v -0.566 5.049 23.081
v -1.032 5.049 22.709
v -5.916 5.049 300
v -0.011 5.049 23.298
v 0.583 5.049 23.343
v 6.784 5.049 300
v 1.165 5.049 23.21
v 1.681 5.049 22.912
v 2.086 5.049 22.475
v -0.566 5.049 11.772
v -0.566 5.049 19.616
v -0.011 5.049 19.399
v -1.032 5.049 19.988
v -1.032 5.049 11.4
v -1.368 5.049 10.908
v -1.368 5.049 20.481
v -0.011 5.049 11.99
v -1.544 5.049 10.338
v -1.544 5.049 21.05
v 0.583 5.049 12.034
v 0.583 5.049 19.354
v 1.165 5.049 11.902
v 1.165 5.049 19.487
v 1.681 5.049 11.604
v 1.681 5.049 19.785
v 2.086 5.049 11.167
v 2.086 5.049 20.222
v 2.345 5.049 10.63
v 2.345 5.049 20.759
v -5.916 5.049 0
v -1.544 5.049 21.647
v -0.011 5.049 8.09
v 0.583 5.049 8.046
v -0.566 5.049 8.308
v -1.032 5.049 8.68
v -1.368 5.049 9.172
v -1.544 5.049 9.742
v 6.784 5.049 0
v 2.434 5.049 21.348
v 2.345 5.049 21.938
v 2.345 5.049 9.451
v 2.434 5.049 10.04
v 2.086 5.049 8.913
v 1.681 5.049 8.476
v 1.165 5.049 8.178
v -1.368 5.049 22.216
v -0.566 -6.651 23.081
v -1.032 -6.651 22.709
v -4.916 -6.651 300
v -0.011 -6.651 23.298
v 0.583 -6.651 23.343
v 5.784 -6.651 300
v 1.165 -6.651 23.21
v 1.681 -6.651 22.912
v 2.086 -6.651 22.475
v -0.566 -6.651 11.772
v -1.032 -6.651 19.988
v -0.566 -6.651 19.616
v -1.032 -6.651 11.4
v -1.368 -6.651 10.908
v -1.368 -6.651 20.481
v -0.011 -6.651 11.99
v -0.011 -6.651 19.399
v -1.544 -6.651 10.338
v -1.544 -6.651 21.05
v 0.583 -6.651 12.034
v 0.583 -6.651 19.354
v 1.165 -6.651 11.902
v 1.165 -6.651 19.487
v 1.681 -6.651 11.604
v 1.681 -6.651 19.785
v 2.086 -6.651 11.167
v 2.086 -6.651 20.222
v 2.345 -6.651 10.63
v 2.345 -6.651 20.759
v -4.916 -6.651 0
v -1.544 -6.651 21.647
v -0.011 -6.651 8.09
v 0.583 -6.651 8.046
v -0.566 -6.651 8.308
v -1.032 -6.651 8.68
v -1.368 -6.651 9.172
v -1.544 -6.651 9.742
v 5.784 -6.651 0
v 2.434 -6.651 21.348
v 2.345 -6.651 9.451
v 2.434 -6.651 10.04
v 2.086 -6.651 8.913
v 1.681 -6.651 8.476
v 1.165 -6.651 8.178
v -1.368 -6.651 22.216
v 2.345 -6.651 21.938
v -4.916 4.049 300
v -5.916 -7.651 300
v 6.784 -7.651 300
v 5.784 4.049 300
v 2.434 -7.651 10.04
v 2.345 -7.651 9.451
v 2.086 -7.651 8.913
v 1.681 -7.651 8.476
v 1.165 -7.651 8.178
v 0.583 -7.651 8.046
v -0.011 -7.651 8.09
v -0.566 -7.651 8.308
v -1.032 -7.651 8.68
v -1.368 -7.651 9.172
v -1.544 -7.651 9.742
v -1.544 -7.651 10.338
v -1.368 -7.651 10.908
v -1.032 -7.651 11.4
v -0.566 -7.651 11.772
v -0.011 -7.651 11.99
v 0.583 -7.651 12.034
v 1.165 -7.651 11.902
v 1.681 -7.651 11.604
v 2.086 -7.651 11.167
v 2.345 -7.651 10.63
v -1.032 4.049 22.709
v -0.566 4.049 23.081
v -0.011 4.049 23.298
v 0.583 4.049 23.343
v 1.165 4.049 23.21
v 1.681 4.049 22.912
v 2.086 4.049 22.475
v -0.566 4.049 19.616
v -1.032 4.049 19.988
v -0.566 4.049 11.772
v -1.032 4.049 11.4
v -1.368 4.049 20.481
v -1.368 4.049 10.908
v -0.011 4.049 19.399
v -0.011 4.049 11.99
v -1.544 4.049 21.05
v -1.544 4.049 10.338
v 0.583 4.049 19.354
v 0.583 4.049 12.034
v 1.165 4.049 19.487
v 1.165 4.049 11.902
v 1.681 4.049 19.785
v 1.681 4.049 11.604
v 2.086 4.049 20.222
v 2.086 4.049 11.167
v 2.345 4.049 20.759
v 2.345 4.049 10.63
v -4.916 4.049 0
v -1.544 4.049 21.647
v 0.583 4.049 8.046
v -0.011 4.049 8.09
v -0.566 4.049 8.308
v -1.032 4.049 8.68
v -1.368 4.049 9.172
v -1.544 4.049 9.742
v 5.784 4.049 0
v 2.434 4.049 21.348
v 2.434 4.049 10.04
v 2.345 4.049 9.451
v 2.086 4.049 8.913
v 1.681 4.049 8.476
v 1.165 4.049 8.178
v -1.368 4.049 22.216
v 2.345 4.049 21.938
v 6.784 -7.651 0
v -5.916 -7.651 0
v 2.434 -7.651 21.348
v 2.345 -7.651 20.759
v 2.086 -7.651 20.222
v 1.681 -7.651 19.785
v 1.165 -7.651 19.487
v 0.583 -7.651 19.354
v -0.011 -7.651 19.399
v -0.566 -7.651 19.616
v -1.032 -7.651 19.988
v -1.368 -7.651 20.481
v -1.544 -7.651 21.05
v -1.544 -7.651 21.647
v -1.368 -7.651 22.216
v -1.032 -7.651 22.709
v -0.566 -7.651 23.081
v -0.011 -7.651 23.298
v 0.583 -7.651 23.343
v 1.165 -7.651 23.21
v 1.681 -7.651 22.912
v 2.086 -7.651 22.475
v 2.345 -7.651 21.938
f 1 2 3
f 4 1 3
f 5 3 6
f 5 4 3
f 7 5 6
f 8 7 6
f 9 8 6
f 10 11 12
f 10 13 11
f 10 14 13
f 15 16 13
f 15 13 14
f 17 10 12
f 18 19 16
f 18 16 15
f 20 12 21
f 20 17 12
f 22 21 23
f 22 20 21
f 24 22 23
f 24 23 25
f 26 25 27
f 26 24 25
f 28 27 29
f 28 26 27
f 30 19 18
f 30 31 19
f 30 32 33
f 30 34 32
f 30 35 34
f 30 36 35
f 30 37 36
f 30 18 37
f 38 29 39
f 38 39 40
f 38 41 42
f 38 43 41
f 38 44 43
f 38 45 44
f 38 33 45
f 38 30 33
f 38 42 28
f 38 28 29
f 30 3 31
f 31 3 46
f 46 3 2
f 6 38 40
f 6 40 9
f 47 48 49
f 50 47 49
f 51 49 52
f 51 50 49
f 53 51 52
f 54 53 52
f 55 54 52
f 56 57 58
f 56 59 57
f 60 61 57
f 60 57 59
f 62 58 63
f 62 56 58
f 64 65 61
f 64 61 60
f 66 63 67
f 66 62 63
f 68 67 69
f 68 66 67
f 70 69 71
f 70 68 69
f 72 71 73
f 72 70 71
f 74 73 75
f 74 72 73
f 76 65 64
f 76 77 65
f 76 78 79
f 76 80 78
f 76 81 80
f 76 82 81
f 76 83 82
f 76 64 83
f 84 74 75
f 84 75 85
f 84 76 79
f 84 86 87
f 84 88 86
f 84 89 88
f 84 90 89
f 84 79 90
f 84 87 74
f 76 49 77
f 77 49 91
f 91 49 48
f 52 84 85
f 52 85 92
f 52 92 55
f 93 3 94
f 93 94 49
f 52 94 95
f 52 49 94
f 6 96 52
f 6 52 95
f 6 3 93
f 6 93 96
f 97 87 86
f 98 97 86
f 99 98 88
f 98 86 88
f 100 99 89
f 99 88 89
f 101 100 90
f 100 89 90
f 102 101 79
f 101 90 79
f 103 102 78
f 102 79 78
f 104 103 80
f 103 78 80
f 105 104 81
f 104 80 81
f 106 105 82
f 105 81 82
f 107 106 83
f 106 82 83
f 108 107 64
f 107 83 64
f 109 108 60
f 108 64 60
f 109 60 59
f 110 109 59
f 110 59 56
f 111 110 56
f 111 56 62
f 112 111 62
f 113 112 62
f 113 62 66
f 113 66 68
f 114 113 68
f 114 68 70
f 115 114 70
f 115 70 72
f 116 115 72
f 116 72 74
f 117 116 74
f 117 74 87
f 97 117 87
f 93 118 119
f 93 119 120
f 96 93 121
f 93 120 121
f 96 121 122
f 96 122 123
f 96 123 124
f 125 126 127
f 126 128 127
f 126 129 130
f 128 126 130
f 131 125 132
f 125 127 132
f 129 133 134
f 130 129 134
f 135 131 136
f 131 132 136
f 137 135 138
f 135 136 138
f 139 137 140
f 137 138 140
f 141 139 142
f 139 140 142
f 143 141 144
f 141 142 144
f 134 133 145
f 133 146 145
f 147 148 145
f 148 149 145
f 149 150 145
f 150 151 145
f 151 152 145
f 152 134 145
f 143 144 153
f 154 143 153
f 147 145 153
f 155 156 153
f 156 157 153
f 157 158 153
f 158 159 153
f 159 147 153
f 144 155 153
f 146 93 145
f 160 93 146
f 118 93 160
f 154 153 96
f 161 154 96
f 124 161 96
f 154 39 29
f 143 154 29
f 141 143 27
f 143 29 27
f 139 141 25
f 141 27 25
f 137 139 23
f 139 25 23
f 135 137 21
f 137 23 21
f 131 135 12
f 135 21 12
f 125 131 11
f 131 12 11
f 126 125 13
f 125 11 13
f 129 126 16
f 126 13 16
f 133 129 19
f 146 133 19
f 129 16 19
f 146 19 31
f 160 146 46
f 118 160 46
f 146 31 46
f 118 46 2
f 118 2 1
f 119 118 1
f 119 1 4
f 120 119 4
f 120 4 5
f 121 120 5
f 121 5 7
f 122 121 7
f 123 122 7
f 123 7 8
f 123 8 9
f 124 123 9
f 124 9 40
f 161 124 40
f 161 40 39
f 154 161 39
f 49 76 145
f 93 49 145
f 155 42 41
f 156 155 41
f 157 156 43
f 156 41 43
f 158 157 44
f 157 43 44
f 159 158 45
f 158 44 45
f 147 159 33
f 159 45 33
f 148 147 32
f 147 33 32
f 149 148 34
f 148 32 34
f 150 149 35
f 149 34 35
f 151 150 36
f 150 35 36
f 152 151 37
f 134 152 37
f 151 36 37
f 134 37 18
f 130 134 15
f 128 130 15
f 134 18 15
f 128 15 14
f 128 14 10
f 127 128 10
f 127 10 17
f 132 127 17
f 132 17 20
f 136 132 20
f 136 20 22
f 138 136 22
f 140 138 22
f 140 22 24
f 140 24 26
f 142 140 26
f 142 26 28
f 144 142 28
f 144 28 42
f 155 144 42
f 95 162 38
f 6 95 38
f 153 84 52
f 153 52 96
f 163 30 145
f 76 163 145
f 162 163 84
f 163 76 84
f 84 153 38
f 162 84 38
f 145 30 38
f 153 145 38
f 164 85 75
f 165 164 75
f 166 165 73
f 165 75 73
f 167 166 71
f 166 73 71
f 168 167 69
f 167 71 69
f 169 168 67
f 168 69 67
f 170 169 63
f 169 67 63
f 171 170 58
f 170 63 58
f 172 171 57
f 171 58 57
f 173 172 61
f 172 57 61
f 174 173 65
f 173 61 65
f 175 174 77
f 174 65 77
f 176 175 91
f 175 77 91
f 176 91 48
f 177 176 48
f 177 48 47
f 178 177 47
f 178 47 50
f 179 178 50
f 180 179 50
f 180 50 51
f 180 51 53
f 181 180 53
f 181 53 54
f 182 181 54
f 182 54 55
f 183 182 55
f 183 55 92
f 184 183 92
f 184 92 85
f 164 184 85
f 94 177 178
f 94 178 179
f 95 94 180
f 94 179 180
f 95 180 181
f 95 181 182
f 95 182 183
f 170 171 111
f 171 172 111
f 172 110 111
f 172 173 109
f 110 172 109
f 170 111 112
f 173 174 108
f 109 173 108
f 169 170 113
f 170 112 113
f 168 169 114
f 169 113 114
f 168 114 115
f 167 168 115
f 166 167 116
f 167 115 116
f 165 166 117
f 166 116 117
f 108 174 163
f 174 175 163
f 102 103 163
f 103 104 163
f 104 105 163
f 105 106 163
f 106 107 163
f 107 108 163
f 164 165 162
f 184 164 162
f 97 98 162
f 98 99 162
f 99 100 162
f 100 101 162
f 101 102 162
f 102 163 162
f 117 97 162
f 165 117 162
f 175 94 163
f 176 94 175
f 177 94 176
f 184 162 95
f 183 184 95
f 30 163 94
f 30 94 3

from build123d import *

# Parameters (mm, degrees)
SKETCH1_W           = 12.7
SKETCH1_H           = 12.7
BOSS_EXTRUDE1_DEPTH = 300
SHELL18_T           = -1
SKETCH2_R           = 2
CUT_EXTRUDE1_DEPTH  = 30
SKETCH3_R           = 2
CUT_EXTRUDE2_DEPTH  = 20


with BuildPart() as part:
    # Sketch1 → Boss-Extrude1 (new body)
    with BuildSketch(Plane.XY):
        with Locations((0.433911759, -1.30095226)):
            Rectangle(SKETCH1_W, SKETCH1_H)
    extrude(amount=BOSS_EXTRUDE1_DEPTH)

    # Shell18
    shell18_openings = [part.faces().sort_by_distance(p)[0] for p in [
        (0.433911759, -1.30095226, 300),
        (0.433911759, -1.30095226, 0),
    ]]
    offset(amount=SHELL18_T, openings=shell18_openings, kind=Kind.INTERSECTION)

    # Sketch2 → Cut-Extrude1 (cut)
    with BuildSketch(Plane(origin=(0, 5.04904774, 0), x_dir=(1, 0, 0), z_dir=(0, 1, 0))):
        with Locations((0.433911759, -10.040040702)):
            Circle(SKETCH2_R)
        with Locations((0.433911759, -21.34849815)):
            Circle(SKETCH2_R)
    extrude(amount=-CUT_EXTRUDE1_DEPTH, mode=Mode.SUBTRACT)

    # Sketch3 → Cut-Extrude2 (cut)
    with BuildSketch(Plane(origin=(0, 5.04904774, 0), x_dir=(1, 0, 0), z_dir=(0, 1, 0))):
        with Locations((0.433911759, -336)):
            Circle(SKETCH3_R)
        with Locations((0.433911759, -316)):
            Circle(SKETCH3_R)
    extrude(amount=-CUT_EXTRUDE2_DEPTH, mode=Mode.SUBTRACT)


solid = part.part
